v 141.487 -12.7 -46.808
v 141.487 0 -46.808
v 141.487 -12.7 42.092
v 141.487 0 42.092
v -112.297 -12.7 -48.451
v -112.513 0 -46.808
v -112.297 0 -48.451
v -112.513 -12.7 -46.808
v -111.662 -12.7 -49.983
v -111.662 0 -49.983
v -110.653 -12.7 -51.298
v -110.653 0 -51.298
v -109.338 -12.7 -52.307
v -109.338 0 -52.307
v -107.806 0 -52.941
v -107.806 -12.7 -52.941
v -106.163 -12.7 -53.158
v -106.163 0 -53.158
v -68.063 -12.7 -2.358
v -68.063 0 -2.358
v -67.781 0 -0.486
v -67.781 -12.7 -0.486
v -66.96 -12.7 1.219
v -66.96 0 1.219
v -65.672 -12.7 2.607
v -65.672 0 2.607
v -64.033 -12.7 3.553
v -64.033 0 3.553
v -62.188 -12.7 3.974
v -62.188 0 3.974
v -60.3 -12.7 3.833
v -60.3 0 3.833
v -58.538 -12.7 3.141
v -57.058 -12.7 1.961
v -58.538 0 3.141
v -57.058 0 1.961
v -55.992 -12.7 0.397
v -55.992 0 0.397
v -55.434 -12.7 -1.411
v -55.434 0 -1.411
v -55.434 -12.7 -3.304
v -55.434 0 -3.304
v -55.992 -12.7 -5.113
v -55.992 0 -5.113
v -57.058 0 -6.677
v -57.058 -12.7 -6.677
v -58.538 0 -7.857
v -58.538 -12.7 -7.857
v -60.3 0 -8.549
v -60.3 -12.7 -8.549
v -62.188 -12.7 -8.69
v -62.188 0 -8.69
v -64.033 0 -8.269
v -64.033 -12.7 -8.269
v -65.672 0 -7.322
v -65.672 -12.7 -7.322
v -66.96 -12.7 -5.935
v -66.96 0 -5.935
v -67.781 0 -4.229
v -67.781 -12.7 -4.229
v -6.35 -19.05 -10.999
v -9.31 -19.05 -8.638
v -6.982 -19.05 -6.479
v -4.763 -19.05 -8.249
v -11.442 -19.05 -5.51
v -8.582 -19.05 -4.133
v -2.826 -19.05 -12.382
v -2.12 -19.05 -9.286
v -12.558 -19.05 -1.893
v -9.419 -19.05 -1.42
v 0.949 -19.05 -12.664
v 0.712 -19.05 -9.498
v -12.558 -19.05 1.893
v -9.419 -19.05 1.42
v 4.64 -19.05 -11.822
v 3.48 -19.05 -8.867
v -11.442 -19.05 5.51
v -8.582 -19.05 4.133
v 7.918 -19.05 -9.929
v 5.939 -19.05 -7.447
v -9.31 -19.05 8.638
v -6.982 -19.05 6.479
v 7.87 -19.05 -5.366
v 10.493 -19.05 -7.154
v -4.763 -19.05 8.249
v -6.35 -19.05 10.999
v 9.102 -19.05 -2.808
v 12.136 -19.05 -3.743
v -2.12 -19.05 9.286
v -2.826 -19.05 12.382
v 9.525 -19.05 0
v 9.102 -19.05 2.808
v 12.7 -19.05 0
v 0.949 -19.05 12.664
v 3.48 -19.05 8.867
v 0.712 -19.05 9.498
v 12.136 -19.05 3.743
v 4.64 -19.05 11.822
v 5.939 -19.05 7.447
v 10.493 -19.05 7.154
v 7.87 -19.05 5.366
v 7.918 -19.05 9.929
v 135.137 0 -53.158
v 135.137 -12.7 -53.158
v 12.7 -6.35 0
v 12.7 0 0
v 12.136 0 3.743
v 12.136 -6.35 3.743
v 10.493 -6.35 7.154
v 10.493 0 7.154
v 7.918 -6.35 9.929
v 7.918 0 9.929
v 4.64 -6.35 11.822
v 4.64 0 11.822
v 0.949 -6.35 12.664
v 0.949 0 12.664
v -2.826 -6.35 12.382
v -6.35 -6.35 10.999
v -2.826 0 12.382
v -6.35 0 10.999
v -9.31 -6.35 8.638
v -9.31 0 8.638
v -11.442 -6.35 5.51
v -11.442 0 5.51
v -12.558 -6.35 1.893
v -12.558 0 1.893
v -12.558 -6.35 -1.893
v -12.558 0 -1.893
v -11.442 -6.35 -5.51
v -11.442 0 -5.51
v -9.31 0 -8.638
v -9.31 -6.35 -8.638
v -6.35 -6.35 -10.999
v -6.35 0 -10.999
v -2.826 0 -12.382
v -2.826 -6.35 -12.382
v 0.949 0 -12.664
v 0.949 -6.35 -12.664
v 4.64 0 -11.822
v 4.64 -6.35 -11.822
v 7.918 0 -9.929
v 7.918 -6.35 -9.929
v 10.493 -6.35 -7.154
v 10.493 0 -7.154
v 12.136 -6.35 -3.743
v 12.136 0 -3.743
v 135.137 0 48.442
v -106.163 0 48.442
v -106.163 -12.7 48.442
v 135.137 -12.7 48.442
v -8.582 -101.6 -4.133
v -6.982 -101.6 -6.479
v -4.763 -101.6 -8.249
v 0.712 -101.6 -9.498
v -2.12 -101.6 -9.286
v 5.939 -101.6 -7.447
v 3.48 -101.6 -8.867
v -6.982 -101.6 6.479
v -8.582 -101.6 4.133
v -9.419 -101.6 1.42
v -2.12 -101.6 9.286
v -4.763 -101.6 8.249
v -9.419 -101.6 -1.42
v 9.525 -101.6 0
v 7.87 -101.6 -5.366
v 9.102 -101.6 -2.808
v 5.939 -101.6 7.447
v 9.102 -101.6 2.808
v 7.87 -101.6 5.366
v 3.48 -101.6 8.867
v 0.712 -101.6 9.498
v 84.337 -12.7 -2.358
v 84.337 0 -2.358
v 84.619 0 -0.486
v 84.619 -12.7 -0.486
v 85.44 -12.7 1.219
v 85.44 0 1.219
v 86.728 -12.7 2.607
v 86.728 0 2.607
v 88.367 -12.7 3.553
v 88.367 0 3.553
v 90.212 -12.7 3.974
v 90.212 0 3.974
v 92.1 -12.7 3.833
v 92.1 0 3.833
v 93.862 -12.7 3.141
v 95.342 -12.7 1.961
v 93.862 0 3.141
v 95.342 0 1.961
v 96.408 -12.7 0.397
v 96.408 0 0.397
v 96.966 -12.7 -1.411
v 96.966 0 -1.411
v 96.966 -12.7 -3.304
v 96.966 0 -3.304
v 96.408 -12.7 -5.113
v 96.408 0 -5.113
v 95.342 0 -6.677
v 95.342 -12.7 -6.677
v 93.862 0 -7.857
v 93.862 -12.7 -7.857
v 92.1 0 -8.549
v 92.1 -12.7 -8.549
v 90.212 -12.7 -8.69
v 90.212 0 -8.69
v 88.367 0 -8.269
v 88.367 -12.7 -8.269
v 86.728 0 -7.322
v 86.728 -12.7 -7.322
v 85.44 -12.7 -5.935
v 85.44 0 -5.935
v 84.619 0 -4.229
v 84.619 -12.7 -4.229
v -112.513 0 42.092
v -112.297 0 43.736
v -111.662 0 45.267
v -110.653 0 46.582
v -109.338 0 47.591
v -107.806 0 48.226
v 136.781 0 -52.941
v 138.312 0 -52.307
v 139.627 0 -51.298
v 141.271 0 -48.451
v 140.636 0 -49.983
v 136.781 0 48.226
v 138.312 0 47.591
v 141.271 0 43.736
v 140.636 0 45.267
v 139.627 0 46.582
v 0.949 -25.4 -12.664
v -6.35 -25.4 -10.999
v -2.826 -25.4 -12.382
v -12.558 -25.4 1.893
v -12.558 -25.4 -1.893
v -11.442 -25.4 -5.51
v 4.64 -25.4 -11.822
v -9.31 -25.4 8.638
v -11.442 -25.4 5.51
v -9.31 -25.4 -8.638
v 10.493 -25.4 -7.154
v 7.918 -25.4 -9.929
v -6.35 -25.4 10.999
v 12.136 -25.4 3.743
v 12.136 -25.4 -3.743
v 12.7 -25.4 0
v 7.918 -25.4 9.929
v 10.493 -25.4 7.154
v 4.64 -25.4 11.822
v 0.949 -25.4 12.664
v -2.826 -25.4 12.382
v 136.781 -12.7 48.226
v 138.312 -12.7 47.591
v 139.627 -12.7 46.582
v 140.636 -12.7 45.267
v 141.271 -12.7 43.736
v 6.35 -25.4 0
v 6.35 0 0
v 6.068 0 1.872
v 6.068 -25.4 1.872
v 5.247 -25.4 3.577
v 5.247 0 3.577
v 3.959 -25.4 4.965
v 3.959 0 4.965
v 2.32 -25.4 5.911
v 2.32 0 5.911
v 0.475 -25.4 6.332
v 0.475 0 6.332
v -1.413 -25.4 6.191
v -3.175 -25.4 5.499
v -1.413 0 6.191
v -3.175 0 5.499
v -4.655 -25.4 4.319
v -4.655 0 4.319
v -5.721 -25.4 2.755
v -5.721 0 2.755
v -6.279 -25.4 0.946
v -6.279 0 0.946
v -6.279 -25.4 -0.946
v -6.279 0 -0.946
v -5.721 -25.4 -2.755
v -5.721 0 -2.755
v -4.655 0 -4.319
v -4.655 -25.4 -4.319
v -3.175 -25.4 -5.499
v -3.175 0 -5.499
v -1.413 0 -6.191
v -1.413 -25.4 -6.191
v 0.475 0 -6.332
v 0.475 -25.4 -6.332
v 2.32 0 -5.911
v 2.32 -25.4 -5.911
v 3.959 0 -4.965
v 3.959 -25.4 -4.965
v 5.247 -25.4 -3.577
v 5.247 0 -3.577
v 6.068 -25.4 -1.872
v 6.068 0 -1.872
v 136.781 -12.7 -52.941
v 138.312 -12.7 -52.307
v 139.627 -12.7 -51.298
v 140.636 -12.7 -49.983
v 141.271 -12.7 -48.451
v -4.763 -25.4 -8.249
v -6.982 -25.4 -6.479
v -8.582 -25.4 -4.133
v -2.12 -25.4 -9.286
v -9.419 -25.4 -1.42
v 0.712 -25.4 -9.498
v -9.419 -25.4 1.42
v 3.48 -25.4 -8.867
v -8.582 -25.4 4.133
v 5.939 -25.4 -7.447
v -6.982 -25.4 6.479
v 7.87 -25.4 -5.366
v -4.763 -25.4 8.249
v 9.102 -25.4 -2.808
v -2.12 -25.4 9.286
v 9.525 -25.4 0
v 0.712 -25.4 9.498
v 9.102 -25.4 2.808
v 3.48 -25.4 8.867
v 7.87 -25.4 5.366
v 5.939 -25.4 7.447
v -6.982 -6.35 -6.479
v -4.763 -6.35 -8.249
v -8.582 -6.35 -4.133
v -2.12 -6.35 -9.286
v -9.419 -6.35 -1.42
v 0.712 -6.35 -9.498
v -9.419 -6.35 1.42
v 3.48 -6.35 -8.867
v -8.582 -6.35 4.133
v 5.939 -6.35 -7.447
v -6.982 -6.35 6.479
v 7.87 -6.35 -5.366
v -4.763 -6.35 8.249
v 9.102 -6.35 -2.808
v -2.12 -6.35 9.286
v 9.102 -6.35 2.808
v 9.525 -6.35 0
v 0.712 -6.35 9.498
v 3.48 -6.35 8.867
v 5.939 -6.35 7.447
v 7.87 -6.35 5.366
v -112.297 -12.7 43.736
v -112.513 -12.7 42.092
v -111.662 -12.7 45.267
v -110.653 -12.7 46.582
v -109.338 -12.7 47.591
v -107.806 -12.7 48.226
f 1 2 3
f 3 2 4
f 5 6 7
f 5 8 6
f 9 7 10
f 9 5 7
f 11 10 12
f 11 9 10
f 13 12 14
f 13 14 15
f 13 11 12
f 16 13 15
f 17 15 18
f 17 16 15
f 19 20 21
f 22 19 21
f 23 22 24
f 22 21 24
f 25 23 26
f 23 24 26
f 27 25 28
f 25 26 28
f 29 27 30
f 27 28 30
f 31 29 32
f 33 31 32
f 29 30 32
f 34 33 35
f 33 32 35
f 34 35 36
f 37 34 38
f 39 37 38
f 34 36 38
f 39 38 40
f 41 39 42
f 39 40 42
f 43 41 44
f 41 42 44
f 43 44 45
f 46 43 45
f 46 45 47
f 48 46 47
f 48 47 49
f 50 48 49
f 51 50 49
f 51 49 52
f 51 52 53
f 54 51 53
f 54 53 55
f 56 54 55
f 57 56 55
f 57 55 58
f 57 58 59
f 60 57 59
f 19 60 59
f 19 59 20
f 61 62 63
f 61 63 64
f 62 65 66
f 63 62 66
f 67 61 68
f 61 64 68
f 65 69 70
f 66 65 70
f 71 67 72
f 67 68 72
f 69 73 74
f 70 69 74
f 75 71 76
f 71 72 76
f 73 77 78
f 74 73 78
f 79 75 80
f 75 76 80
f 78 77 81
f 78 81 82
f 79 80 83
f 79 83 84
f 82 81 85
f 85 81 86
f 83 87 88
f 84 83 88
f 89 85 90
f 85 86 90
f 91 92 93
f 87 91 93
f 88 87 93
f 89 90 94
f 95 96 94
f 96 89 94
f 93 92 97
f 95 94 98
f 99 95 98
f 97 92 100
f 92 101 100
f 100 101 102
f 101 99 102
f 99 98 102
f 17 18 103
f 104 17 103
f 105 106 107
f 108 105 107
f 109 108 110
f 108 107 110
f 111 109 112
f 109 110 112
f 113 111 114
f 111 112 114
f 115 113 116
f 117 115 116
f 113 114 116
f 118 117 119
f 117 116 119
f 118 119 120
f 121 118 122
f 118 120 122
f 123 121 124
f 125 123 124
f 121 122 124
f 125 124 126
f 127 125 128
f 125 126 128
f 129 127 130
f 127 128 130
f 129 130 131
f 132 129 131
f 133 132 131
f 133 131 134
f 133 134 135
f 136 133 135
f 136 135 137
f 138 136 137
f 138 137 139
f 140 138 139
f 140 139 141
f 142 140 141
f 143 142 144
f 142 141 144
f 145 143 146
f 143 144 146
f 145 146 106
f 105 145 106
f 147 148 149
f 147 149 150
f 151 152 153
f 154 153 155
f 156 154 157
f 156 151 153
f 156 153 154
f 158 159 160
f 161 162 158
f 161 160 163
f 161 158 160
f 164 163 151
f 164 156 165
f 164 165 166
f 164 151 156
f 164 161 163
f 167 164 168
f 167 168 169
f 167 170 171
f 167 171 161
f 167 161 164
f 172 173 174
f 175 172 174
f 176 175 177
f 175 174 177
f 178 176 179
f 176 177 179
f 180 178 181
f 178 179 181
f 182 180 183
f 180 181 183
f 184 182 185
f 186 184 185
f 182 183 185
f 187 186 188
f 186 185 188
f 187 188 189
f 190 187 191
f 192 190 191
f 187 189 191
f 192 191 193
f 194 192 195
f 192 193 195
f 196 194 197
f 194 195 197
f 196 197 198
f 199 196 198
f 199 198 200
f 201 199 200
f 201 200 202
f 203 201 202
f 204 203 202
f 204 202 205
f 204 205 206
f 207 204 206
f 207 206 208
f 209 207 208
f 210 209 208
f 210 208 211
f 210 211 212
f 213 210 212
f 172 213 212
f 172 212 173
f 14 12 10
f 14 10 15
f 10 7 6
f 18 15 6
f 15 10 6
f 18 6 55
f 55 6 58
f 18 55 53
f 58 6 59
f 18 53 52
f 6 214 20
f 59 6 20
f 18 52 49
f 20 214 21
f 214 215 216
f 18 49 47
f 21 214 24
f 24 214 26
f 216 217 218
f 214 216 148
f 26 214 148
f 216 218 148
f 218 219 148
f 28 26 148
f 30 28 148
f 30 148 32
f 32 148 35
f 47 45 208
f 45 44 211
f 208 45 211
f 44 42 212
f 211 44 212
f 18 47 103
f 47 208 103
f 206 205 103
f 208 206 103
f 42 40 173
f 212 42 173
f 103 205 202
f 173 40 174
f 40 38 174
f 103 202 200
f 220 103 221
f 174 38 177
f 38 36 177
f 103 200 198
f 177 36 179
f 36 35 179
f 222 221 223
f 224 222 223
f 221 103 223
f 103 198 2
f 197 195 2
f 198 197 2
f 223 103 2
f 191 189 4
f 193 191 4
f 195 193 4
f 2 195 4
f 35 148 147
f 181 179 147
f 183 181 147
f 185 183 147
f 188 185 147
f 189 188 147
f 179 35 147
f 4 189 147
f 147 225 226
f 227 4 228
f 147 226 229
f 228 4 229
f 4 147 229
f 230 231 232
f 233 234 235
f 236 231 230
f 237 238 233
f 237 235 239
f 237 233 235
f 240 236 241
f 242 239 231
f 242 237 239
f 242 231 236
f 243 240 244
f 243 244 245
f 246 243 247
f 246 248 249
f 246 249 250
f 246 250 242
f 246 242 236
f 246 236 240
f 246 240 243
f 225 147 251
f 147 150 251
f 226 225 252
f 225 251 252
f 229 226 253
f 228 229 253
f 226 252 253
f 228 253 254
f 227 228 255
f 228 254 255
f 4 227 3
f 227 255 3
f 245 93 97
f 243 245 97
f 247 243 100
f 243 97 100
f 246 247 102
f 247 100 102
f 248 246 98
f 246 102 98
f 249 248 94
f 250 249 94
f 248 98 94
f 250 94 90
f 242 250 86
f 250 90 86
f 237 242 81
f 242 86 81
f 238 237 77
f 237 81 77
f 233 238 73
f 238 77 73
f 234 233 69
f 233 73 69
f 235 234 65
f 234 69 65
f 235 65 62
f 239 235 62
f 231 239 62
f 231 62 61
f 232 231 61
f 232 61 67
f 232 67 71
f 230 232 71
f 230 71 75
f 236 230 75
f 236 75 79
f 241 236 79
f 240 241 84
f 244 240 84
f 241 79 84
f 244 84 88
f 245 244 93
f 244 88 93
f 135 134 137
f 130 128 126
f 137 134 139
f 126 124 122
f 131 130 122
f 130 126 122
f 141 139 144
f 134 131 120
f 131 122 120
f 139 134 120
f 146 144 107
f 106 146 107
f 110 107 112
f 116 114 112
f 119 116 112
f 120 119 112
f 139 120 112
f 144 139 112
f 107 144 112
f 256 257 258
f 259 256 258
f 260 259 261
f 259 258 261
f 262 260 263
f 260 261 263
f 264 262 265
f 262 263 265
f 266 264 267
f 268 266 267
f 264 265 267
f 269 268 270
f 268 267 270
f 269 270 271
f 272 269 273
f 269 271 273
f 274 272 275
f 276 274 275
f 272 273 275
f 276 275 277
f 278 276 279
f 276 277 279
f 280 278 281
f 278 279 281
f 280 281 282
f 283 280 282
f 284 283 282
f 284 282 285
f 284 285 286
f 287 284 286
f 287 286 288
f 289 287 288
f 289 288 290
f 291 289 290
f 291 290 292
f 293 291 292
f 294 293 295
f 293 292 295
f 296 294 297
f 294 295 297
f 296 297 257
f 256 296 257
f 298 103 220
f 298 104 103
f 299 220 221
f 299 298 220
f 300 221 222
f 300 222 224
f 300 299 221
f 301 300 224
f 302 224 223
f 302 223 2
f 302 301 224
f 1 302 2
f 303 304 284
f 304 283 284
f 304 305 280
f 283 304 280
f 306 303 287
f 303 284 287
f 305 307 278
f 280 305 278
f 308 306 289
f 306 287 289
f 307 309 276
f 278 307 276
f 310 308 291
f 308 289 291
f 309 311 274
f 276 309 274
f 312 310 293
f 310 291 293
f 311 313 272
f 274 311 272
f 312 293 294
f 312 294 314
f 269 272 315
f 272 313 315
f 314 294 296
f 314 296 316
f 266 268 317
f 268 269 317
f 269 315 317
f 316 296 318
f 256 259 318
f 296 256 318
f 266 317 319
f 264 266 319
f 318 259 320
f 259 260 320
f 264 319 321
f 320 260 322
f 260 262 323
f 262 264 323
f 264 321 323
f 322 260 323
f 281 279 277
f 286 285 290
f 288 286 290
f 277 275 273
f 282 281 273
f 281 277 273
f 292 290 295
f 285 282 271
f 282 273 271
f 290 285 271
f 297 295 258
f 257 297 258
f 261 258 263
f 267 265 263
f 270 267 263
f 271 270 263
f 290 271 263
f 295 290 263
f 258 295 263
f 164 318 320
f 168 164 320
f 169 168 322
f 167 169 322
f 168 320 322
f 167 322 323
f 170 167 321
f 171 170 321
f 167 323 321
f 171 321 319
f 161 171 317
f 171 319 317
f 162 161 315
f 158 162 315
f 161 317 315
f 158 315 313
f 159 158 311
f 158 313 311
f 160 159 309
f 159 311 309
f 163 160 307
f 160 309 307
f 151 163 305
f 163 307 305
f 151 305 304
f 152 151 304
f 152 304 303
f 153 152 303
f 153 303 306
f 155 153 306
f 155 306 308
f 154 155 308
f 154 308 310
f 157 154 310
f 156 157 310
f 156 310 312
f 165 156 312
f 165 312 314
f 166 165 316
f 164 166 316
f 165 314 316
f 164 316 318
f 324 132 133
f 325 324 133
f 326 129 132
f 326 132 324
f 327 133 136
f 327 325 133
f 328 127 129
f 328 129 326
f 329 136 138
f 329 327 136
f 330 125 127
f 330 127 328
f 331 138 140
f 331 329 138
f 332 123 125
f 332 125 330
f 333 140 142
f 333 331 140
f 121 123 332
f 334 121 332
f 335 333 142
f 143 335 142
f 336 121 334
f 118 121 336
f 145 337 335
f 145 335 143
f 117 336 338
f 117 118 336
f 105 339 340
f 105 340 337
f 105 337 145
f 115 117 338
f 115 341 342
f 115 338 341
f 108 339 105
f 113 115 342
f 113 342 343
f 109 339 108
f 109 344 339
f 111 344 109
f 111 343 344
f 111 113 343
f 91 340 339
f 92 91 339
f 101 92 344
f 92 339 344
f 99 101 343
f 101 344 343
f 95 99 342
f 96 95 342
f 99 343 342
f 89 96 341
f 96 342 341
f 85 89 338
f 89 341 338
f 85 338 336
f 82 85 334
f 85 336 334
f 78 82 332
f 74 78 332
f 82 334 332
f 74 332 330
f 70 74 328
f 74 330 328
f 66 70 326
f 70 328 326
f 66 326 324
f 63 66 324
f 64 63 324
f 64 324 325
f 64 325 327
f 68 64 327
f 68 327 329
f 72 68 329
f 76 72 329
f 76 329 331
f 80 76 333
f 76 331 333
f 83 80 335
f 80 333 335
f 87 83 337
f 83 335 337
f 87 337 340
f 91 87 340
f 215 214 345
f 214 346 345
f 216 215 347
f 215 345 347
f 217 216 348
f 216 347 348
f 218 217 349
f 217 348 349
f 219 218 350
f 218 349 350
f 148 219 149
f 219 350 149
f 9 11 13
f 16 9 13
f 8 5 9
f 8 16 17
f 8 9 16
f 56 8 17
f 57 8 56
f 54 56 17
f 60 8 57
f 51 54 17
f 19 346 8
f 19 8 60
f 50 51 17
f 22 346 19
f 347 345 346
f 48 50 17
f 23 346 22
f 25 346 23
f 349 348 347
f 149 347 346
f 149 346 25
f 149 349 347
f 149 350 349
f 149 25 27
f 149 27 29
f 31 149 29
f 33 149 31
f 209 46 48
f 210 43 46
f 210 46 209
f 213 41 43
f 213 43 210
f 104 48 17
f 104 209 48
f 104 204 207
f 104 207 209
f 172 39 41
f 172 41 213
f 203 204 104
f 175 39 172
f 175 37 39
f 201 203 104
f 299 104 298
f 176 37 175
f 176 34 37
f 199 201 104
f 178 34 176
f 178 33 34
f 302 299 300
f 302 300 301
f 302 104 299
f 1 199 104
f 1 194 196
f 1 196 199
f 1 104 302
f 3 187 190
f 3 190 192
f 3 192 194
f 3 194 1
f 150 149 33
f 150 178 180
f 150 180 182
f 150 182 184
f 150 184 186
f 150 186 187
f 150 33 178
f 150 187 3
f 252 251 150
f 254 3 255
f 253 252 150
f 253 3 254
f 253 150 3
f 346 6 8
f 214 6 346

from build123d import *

# Parameters (mm, degrees)
F0_W      = 254
F0_H      = 101.6
F1_DEPTH  = 12.7
F3_D      = 12.7
F4_R      = 6.35
F5_R      = 12.7
F6_DEPTH  = 6.35
F7_R      = 9.525
F8_DEPTH  = 12.7
F9_R      = 12.7
F10_DEPTH = 6.35
F11_R     = 6.35
F12_DEPTH = 25.4
F13_R     = 9.525
F14_DEPTH = 76.2


with BuildPart() as f1:
    # F0 (on Front) → F1 (new body)
    with BuildSketch(Plane.XZ):
        with Locations((14.4870150834, -2.3577771693)):
            Rectangle(F0_W, F0_H)
    extrude(amount=F1_DEPTH)

    # F3 (through all)
    with Locations(Plane.XZ.offset(12.7)):
        with Locations((-61.7129849166, -2.3577771693), (90.6870150834, -2.3577771693)):
            Hole(F3_D / 2)

    # F4
    f4_edges = [f1.edges().sort_by_distance(p)[0] for p in [
        (-112.512985, -6.35, 48.442223),
        (-112.512985, -6.35, -53.157777),
        (141.487015, -6.35, 48.442223),
        (141.487015, -6.35, -53.157777),
    ]]
    fillet(f4_edges, radius=F4_R)


with BuildPart() as f6:
    # F5 (on Front) → F6 (new body)
    with BuildSketch(Plane.XZ):
        Circle(F5_R)
    extrude(amount=F6_DEPTH)

    # F7 (on face) → F8 (join)
    with BuildSketch(Plane.XZ.offset(6.35)):
        Circle(F7_R)
    extrude(amount=F8_DEPTH)

    # F9 (on face) → F10 (join)
    with BuildSketch(Plane.XZ.offset(19.05)):
        Circle(F9_R)
    extrude(amount=F10_DEPTH)


with BuildPart() as f12:
    # F11 (on Front) → F12 (new body)
    with BuildSketch(Plane.XZ):
        Circle(F11_R)
    extrude(amount=F12_DEPTH)

    # F13 (on face) → F14 (join)
    with BuildSketch(Plane.XZ.offset(25.4)):
        Circle(F13_R)
    extrude(amount=F14_DEPTH)


solid = Compound([f1.part, f6.part, f12.part])
